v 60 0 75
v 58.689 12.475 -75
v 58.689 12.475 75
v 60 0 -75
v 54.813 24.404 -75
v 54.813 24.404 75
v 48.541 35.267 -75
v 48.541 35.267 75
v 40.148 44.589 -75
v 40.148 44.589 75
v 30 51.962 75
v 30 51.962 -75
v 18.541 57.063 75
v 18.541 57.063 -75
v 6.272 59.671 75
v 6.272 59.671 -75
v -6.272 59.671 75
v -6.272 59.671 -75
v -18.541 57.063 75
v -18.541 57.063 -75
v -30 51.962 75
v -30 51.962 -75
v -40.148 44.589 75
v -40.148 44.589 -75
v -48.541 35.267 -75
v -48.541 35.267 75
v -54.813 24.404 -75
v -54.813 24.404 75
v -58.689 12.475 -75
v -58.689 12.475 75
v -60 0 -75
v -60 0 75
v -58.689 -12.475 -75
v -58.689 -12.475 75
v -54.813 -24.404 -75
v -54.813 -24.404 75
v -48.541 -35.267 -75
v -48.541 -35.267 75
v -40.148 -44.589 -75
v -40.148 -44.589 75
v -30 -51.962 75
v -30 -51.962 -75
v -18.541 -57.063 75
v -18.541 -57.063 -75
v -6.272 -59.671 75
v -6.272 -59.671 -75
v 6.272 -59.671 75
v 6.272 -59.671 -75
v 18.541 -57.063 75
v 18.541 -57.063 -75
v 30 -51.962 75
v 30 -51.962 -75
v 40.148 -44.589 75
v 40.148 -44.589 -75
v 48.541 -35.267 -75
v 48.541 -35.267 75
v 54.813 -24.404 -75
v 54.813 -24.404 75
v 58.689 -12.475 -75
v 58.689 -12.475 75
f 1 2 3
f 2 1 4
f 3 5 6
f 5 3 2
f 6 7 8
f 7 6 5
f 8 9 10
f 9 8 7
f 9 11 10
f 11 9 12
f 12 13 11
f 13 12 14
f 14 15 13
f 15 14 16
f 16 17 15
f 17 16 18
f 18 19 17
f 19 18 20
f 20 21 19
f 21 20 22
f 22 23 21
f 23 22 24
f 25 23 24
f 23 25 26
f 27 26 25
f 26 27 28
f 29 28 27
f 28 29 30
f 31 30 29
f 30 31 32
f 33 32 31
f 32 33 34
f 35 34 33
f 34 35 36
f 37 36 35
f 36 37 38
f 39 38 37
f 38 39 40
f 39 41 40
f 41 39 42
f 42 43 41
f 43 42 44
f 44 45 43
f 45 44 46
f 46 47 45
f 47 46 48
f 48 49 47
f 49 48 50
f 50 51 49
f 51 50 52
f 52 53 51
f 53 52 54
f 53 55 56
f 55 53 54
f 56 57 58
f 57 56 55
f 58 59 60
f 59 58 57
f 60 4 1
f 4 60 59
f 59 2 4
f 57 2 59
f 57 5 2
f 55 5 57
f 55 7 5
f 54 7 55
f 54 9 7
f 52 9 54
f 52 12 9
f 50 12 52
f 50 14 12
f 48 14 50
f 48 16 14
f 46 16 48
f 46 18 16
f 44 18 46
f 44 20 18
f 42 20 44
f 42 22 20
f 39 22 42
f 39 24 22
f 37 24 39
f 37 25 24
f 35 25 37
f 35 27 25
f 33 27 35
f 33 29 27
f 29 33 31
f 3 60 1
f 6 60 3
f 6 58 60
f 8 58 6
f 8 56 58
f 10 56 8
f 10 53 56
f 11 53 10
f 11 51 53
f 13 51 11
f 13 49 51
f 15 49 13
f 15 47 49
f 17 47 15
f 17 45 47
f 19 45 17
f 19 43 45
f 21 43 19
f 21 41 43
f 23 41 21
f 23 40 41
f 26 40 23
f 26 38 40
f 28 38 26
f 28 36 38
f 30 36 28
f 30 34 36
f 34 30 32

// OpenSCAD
module centered_cylinder() {
    // $B1_Cl$NCf1{$r86E@$KG[CV(B
    translate([0, 0, -75])
        cylinder(h=150, r=60);
}

// $BA4BN$N7A>u$rIA2h(B
centered_cylinder();
